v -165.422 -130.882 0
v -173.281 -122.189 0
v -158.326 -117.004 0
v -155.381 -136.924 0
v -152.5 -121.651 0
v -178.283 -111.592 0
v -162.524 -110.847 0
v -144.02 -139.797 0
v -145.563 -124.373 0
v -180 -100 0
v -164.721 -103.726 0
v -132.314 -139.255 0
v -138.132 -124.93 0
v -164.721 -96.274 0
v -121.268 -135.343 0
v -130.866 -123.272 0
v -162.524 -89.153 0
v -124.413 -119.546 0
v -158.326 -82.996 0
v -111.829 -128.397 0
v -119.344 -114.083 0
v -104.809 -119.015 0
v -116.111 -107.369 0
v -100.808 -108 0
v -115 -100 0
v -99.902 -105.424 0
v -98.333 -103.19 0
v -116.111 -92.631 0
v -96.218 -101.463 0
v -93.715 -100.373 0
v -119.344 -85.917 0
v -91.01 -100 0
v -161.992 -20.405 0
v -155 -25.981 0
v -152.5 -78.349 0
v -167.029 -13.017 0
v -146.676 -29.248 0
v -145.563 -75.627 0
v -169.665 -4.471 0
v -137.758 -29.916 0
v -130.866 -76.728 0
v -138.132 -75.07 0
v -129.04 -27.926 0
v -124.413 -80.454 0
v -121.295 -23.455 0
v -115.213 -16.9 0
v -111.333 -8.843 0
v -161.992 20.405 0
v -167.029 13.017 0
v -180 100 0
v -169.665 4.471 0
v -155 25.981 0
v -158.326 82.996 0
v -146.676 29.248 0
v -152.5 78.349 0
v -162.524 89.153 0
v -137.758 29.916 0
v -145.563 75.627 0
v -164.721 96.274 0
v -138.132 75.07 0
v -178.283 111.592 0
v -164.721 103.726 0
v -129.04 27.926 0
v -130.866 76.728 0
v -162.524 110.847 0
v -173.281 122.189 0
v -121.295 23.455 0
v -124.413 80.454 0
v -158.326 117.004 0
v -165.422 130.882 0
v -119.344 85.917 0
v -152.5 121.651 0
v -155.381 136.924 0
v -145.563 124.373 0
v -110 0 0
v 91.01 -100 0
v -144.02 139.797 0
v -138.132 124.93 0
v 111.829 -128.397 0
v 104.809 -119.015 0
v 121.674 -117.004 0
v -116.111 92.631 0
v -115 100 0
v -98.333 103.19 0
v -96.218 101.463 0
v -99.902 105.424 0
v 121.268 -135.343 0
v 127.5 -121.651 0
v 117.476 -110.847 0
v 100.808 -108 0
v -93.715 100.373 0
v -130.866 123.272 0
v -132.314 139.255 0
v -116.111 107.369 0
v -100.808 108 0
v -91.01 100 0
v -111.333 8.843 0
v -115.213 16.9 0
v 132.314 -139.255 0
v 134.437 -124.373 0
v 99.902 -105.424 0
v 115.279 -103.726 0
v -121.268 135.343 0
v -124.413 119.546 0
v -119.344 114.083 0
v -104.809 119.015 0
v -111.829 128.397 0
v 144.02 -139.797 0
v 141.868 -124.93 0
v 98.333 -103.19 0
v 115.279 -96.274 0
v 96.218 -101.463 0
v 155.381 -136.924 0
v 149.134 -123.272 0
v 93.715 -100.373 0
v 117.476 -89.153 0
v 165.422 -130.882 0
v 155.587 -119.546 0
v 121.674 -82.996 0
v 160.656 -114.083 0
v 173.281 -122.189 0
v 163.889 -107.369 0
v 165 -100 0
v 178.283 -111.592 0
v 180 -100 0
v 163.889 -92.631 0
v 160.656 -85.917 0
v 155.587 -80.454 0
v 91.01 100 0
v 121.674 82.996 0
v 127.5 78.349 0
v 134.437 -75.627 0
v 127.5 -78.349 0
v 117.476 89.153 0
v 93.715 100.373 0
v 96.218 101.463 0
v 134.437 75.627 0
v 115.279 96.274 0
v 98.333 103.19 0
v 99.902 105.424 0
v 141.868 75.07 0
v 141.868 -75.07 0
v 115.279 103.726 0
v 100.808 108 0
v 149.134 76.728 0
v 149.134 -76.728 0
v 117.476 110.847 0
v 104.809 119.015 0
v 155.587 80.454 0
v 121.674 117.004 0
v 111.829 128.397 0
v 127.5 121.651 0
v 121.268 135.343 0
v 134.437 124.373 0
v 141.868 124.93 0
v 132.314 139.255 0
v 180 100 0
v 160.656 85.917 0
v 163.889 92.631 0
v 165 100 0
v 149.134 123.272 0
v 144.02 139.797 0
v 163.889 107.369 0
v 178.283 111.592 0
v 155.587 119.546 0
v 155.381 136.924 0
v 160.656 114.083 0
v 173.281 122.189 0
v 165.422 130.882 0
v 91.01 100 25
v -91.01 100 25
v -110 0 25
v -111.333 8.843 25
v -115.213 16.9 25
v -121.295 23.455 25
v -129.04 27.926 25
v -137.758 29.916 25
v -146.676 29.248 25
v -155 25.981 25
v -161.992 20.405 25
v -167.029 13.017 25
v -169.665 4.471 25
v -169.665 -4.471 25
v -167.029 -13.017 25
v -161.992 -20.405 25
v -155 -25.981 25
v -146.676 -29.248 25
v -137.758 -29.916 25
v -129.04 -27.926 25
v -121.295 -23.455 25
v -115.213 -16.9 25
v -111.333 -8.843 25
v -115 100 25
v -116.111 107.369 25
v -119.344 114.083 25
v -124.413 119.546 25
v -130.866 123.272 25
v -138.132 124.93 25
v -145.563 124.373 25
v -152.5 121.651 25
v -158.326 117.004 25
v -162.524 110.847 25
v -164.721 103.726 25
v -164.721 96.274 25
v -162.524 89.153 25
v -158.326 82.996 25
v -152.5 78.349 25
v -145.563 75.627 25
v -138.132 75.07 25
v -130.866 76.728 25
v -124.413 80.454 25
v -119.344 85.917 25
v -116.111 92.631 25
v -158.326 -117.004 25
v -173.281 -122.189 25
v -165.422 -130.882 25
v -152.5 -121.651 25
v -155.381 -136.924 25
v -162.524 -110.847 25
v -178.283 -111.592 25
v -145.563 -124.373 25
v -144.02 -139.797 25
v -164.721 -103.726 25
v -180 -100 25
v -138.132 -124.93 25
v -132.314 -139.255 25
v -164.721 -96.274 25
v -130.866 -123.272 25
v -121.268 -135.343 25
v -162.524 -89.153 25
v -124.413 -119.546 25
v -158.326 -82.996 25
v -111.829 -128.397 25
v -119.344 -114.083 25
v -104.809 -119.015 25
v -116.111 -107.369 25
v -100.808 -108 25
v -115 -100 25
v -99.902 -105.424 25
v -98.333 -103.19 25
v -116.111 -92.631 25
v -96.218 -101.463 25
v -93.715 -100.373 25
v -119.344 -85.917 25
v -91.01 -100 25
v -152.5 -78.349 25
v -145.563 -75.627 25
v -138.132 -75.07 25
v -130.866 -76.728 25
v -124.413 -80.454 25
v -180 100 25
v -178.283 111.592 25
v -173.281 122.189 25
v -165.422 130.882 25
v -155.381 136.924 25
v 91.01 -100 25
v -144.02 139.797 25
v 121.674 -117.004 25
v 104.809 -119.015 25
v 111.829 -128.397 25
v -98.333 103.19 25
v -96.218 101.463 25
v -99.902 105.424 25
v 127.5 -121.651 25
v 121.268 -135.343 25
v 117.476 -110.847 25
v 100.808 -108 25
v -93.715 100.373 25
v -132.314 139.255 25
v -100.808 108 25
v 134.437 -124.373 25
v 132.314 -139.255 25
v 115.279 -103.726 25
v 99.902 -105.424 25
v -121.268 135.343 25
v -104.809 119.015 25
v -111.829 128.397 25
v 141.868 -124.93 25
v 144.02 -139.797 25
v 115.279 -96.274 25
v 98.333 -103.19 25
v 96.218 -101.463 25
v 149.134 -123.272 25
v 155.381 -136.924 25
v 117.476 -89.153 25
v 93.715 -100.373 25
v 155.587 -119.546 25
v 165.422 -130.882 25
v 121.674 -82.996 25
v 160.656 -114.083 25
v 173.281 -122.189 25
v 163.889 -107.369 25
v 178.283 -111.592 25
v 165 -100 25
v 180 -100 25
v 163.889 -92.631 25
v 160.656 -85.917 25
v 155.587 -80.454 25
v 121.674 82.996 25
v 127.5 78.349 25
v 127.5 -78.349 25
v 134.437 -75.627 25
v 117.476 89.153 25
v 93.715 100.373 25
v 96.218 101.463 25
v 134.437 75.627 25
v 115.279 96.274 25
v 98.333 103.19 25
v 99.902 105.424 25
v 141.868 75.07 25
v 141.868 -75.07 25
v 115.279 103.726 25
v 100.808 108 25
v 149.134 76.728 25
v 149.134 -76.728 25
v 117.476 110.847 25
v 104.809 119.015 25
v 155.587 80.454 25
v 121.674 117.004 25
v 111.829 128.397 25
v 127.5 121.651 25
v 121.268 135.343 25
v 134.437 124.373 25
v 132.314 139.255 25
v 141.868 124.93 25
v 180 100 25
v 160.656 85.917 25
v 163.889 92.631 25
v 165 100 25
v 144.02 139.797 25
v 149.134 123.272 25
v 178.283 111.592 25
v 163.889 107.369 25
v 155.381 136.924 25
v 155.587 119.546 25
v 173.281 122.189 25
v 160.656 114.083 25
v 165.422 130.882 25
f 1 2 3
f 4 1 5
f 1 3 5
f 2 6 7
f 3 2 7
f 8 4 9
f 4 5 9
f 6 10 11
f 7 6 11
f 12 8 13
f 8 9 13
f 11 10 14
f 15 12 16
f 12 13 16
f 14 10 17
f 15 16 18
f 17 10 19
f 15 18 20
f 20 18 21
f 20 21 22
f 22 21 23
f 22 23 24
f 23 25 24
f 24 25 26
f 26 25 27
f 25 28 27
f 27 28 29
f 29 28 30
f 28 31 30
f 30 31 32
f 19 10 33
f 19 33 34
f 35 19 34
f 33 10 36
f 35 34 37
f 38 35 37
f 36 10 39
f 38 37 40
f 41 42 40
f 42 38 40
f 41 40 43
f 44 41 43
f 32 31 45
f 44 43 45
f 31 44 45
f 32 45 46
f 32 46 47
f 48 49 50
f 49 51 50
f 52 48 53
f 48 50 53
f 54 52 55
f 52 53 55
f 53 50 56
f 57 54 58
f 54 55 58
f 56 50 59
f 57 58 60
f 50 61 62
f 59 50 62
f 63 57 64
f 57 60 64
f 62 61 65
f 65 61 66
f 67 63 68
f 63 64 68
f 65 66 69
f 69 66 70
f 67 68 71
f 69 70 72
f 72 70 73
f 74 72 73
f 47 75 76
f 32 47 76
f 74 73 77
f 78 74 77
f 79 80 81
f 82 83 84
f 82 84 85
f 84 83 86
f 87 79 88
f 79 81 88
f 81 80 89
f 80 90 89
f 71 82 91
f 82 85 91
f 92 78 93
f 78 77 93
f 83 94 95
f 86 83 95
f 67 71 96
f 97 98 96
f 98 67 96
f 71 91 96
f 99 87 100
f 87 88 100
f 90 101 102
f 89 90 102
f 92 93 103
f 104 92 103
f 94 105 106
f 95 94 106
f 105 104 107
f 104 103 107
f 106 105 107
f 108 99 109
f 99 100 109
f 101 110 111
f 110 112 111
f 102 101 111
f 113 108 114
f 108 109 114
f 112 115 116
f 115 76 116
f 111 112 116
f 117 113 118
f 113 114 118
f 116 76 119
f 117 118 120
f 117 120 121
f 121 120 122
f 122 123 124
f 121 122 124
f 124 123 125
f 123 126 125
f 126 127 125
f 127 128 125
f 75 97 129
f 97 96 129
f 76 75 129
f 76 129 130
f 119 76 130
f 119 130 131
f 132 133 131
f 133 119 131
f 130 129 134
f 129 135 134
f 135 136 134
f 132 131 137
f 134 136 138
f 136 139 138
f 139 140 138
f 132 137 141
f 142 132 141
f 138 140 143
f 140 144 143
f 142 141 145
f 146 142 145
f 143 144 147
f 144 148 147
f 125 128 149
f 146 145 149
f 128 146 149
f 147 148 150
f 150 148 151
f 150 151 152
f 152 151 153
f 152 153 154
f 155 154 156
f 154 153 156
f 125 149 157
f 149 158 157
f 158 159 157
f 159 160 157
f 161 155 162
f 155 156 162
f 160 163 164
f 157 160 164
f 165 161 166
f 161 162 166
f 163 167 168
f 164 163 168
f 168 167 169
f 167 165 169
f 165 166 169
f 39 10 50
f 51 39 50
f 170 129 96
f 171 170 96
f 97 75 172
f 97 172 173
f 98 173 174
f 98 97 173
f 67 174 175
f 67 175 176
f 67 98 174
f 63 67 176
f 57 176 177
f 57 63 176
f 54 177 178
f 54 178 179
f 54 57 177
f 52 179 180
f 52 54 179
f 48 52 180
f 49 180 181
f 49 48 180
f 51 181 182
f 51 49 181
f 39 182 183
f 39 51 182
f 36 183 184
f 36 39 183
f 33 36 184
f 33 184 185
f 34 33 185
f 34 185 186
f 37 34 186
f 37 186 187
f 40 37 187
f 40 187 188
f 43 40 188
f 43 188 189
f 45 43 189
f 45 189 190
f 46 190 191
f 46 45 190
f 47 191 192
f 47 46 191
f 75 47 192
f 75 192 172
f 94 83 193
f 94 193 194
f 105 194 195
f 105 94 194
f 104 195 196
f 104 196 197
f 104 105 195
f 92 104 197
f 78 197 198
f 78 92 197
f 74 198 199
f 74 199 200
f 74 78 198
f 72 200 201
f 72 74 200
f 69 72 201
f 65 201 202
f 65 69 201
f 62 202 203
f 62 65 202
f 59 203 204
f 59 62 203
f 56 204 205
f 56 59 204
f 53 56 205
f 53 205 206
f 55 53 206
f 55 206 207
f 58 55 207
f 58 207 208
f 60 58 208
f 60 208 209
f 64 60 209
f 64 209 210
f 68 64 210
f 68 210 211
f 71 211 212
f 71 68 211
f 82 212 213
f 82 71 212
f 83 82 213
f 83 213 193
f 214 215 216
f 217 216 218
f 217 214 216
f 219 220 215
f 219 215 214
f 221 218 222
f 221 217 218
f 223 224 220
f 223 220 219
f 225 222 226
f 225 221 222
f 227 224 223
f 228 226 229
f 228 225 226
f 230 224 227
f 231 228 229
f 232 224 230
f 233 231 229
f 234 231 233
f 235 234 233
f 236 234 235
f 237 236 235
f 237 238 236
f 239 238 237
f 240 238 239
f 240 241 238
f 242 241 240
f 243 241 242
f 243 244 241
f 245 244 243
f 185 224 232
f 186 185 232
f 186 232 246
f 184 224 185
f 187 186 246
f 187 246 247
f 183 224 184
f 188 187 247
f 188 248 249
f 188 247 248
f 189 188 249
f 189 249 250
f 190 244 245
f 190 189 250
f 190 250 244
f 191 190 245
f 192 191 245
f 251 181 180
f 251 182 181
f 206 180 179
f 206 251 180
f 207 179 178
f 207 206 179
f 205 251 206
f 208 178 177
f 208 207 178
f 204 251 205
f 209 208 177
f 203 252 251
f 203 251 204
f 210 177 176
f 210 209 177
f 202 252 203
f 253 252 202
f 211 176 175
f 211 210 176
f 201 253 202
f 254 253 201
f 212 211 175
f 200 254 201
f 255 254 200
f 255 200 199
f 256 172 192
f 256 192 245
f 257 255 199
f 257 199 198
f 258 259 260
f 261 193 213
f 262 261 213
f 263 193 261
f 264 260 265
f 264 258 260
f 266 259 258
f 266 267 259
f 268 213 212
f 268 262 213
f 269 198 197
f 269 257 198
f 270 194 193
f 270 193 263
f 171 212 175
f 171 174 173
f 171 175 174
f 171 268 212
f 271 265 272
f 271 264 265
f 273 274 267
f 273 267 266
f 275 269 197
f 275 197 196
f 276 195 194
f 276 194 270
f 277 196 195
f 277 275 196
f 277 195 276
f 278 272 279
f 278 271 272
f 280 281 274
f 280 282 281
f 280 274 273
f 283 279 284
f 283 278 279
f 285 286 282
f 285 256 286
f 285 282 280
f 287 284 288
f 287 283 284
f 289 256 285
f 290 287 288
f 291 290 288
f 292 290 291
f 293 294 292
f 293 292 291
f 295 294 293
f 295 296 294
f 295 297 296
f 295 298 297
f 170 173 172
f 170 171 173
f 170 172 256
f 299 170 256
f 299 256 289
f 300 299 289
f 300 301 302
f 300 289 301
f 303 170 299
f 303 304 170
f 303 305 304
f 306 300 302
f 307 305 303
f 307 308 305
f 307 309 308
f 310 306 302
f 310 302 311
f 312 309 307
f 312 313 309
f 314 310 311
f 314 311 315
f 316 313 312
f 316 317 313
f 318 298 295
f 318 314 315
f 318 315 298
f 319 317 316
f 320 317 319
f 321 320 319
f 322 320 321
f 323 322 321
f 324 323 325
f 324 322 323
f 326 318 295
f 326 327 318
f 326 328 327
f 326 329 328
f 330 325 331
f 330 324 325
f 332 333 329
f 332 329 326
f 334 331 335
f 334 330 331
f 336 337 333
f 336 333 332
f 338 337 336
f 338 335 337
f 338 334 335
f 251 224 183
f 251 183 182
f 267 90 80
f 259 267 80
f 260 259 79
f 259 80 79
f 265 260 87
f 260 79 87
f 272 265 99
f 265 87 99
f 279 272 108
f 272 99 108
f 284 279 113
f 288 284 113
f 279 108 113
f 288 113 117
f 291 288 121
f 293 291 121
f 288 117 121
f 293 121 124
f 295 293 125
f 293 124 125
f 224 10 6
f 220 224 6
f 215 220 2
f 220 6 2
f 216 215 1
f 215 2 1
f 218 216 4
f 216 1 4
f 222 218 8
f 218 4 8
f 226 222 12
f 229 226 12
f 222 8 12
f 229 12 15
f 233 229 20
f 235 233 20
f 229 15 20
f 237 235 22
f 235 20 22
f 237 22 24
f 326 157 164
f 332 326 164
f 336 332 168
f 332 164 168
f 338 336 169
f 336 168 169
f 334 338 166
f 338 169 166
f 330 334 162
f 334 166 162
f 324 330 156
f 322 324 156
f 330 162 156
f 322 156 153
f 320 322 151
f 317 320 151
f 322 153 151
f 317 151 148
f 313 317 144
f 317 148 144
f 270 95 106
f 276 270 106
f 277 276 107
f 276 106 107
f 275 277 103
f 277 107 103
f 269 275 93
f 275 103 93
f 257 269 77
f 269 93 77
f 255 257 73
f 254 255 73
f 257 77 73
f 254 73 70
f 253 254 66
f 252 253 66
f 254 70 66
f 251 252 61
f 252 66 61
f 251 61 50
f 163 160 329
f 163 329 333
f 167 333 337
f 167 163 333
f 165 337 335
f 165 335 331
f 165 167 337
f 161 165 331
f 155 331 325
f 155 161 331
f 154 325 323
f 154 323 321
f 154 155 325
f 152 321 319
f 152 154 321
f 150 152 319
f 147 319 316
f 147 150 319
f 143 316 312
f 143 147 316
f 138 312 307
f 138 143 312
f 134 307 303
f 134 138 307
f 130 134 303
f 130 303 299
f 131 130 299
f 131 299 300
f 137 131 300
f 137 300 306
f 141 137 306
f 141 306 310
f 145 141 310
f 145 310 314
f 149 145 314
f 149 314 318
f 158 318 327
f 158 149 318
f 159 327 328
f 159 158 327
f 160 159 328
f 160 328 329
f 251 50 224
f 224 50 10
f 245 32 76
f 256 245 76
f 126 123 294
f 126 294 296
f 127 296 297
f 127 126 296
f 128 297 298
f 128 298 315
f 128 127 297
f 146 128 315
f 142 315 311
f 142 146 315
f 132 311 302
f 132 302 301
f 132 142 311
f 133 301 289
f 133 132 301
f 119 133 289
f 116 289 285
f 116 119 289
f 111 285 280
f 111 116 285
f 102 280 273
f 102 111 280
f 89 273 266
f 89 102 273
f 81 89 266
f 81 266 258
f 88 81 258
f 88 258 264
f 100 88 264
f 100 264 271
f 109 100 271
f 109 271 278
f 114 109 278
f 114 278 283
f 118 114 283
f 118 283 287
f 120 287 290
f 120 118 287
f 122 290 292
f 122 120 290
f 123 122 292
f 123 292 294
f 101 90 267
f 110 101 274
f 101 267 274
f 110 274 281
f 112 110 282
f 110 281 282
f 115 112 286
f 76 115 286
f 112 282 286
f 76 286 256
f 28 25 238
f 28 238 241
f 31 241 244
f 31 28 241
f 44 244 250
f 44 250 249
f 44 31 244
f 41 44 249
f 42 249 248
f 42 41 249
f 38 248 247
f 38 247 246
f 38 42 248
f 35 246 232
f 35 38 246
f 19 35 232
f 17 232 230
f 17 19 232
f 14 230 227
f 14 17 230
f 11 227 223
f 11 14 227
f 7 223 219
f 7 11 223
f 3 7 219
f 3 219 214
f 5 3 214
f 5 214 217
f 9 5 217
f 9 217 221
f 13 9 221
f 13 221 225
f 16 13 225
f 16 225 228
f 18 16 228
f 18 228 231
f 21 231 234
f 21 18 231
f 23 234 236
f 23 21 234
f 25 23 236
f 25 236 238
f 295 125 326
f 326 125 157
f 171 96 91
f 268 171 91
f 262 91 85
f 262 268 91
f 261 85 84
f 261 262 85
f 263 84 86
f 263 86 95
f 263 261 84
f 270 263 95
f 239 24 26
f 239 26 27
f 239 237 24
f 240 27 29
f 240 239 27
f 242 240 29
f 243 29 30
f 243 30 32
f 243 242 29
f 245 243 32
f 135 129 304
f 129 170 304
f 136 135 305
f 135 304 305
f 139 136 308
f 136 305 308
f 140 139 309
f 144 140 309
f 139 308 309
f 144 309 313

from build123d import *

# Parameters (mm, degrees)
F0_R     = 30
F0_R_2   = 25
F1_DEPTH = 25
F2_R     = 10


with BuildPart() as f1:
    # F0 (on Top) → F1 (new body)
    with BuildSketch(Plane.XY):
        with BuildLine():
            Line((100, 100), (-100, 100))
            ThreePointArc((-100, 100), (-140, 60), (-180, 100))
            Line((-180, 100), (-180, -100))
            ThreePointArc((-180, -100), (-140, -60), (-100, -100))
            Line((-100, -100), (100, -100))
            ThreePointArc((100, -100), (140, -60), (180, -100))
            Line((180, -100), (180, 100))
            ThreePointArc((180, 100), (140, 60), (100, 100))
        make_face()
        with Locations((-140, 0)):
            Circle(F0_R, mode=Mode.SUBTRACT)
        with BuildLine():
            ThreePointArc((-180, 100), (-140, 60), (-100, 100))
            ThreePointArc((-100, 100), (-140, 140), (-180, 100))
        make_face()
        with Locations((-140, 100)):
            Circle(F0_R_2, mode=Mode.SUBTRACT)
        with BuildLine():
            ThreePointArc((180, 100), (140, 140), (100, 100))
            ThreePointArc((100, 100), (140, 60), (180, 100))
        make_face()
        with Locations((140, 100)):
            Circle(F0_R_2, mode=Mode.SUBTRACT)
        with BuildLine():
            ThreePointArc((100, -100), (140, -140), (180, -100))
            ThreePointArc((180, -100), (140, -60), (100, -100))
        make_face()
        with Locations((140, -100)):
            Circle(F0_R_2, mode=Mode.SUBTRACT)
        with BuildLine():
            ThreePointArc((-100, -100), (-140, -60), (-180, -100))
            ThreePointArc((-180, -100), (-140, -140), (-100, -100))
        make_face()
        with Locations((-140, -100)):
            Circle(F0_R_2, mode=Mode.SUBTRACT)
    extrude(amount=F1_DEPTH)

    # F2
    f2_edges = [f1.edges().sort_by_distance(p)[0] for p in [
        (-100, -100, 12.5),
        (100, -100, 12.5),
        (-100, 100, 12.5),
        (100, 100, 12.5),
    ]]
    fillet(f2_edges, radius=F2_R)


solid = f1.part
